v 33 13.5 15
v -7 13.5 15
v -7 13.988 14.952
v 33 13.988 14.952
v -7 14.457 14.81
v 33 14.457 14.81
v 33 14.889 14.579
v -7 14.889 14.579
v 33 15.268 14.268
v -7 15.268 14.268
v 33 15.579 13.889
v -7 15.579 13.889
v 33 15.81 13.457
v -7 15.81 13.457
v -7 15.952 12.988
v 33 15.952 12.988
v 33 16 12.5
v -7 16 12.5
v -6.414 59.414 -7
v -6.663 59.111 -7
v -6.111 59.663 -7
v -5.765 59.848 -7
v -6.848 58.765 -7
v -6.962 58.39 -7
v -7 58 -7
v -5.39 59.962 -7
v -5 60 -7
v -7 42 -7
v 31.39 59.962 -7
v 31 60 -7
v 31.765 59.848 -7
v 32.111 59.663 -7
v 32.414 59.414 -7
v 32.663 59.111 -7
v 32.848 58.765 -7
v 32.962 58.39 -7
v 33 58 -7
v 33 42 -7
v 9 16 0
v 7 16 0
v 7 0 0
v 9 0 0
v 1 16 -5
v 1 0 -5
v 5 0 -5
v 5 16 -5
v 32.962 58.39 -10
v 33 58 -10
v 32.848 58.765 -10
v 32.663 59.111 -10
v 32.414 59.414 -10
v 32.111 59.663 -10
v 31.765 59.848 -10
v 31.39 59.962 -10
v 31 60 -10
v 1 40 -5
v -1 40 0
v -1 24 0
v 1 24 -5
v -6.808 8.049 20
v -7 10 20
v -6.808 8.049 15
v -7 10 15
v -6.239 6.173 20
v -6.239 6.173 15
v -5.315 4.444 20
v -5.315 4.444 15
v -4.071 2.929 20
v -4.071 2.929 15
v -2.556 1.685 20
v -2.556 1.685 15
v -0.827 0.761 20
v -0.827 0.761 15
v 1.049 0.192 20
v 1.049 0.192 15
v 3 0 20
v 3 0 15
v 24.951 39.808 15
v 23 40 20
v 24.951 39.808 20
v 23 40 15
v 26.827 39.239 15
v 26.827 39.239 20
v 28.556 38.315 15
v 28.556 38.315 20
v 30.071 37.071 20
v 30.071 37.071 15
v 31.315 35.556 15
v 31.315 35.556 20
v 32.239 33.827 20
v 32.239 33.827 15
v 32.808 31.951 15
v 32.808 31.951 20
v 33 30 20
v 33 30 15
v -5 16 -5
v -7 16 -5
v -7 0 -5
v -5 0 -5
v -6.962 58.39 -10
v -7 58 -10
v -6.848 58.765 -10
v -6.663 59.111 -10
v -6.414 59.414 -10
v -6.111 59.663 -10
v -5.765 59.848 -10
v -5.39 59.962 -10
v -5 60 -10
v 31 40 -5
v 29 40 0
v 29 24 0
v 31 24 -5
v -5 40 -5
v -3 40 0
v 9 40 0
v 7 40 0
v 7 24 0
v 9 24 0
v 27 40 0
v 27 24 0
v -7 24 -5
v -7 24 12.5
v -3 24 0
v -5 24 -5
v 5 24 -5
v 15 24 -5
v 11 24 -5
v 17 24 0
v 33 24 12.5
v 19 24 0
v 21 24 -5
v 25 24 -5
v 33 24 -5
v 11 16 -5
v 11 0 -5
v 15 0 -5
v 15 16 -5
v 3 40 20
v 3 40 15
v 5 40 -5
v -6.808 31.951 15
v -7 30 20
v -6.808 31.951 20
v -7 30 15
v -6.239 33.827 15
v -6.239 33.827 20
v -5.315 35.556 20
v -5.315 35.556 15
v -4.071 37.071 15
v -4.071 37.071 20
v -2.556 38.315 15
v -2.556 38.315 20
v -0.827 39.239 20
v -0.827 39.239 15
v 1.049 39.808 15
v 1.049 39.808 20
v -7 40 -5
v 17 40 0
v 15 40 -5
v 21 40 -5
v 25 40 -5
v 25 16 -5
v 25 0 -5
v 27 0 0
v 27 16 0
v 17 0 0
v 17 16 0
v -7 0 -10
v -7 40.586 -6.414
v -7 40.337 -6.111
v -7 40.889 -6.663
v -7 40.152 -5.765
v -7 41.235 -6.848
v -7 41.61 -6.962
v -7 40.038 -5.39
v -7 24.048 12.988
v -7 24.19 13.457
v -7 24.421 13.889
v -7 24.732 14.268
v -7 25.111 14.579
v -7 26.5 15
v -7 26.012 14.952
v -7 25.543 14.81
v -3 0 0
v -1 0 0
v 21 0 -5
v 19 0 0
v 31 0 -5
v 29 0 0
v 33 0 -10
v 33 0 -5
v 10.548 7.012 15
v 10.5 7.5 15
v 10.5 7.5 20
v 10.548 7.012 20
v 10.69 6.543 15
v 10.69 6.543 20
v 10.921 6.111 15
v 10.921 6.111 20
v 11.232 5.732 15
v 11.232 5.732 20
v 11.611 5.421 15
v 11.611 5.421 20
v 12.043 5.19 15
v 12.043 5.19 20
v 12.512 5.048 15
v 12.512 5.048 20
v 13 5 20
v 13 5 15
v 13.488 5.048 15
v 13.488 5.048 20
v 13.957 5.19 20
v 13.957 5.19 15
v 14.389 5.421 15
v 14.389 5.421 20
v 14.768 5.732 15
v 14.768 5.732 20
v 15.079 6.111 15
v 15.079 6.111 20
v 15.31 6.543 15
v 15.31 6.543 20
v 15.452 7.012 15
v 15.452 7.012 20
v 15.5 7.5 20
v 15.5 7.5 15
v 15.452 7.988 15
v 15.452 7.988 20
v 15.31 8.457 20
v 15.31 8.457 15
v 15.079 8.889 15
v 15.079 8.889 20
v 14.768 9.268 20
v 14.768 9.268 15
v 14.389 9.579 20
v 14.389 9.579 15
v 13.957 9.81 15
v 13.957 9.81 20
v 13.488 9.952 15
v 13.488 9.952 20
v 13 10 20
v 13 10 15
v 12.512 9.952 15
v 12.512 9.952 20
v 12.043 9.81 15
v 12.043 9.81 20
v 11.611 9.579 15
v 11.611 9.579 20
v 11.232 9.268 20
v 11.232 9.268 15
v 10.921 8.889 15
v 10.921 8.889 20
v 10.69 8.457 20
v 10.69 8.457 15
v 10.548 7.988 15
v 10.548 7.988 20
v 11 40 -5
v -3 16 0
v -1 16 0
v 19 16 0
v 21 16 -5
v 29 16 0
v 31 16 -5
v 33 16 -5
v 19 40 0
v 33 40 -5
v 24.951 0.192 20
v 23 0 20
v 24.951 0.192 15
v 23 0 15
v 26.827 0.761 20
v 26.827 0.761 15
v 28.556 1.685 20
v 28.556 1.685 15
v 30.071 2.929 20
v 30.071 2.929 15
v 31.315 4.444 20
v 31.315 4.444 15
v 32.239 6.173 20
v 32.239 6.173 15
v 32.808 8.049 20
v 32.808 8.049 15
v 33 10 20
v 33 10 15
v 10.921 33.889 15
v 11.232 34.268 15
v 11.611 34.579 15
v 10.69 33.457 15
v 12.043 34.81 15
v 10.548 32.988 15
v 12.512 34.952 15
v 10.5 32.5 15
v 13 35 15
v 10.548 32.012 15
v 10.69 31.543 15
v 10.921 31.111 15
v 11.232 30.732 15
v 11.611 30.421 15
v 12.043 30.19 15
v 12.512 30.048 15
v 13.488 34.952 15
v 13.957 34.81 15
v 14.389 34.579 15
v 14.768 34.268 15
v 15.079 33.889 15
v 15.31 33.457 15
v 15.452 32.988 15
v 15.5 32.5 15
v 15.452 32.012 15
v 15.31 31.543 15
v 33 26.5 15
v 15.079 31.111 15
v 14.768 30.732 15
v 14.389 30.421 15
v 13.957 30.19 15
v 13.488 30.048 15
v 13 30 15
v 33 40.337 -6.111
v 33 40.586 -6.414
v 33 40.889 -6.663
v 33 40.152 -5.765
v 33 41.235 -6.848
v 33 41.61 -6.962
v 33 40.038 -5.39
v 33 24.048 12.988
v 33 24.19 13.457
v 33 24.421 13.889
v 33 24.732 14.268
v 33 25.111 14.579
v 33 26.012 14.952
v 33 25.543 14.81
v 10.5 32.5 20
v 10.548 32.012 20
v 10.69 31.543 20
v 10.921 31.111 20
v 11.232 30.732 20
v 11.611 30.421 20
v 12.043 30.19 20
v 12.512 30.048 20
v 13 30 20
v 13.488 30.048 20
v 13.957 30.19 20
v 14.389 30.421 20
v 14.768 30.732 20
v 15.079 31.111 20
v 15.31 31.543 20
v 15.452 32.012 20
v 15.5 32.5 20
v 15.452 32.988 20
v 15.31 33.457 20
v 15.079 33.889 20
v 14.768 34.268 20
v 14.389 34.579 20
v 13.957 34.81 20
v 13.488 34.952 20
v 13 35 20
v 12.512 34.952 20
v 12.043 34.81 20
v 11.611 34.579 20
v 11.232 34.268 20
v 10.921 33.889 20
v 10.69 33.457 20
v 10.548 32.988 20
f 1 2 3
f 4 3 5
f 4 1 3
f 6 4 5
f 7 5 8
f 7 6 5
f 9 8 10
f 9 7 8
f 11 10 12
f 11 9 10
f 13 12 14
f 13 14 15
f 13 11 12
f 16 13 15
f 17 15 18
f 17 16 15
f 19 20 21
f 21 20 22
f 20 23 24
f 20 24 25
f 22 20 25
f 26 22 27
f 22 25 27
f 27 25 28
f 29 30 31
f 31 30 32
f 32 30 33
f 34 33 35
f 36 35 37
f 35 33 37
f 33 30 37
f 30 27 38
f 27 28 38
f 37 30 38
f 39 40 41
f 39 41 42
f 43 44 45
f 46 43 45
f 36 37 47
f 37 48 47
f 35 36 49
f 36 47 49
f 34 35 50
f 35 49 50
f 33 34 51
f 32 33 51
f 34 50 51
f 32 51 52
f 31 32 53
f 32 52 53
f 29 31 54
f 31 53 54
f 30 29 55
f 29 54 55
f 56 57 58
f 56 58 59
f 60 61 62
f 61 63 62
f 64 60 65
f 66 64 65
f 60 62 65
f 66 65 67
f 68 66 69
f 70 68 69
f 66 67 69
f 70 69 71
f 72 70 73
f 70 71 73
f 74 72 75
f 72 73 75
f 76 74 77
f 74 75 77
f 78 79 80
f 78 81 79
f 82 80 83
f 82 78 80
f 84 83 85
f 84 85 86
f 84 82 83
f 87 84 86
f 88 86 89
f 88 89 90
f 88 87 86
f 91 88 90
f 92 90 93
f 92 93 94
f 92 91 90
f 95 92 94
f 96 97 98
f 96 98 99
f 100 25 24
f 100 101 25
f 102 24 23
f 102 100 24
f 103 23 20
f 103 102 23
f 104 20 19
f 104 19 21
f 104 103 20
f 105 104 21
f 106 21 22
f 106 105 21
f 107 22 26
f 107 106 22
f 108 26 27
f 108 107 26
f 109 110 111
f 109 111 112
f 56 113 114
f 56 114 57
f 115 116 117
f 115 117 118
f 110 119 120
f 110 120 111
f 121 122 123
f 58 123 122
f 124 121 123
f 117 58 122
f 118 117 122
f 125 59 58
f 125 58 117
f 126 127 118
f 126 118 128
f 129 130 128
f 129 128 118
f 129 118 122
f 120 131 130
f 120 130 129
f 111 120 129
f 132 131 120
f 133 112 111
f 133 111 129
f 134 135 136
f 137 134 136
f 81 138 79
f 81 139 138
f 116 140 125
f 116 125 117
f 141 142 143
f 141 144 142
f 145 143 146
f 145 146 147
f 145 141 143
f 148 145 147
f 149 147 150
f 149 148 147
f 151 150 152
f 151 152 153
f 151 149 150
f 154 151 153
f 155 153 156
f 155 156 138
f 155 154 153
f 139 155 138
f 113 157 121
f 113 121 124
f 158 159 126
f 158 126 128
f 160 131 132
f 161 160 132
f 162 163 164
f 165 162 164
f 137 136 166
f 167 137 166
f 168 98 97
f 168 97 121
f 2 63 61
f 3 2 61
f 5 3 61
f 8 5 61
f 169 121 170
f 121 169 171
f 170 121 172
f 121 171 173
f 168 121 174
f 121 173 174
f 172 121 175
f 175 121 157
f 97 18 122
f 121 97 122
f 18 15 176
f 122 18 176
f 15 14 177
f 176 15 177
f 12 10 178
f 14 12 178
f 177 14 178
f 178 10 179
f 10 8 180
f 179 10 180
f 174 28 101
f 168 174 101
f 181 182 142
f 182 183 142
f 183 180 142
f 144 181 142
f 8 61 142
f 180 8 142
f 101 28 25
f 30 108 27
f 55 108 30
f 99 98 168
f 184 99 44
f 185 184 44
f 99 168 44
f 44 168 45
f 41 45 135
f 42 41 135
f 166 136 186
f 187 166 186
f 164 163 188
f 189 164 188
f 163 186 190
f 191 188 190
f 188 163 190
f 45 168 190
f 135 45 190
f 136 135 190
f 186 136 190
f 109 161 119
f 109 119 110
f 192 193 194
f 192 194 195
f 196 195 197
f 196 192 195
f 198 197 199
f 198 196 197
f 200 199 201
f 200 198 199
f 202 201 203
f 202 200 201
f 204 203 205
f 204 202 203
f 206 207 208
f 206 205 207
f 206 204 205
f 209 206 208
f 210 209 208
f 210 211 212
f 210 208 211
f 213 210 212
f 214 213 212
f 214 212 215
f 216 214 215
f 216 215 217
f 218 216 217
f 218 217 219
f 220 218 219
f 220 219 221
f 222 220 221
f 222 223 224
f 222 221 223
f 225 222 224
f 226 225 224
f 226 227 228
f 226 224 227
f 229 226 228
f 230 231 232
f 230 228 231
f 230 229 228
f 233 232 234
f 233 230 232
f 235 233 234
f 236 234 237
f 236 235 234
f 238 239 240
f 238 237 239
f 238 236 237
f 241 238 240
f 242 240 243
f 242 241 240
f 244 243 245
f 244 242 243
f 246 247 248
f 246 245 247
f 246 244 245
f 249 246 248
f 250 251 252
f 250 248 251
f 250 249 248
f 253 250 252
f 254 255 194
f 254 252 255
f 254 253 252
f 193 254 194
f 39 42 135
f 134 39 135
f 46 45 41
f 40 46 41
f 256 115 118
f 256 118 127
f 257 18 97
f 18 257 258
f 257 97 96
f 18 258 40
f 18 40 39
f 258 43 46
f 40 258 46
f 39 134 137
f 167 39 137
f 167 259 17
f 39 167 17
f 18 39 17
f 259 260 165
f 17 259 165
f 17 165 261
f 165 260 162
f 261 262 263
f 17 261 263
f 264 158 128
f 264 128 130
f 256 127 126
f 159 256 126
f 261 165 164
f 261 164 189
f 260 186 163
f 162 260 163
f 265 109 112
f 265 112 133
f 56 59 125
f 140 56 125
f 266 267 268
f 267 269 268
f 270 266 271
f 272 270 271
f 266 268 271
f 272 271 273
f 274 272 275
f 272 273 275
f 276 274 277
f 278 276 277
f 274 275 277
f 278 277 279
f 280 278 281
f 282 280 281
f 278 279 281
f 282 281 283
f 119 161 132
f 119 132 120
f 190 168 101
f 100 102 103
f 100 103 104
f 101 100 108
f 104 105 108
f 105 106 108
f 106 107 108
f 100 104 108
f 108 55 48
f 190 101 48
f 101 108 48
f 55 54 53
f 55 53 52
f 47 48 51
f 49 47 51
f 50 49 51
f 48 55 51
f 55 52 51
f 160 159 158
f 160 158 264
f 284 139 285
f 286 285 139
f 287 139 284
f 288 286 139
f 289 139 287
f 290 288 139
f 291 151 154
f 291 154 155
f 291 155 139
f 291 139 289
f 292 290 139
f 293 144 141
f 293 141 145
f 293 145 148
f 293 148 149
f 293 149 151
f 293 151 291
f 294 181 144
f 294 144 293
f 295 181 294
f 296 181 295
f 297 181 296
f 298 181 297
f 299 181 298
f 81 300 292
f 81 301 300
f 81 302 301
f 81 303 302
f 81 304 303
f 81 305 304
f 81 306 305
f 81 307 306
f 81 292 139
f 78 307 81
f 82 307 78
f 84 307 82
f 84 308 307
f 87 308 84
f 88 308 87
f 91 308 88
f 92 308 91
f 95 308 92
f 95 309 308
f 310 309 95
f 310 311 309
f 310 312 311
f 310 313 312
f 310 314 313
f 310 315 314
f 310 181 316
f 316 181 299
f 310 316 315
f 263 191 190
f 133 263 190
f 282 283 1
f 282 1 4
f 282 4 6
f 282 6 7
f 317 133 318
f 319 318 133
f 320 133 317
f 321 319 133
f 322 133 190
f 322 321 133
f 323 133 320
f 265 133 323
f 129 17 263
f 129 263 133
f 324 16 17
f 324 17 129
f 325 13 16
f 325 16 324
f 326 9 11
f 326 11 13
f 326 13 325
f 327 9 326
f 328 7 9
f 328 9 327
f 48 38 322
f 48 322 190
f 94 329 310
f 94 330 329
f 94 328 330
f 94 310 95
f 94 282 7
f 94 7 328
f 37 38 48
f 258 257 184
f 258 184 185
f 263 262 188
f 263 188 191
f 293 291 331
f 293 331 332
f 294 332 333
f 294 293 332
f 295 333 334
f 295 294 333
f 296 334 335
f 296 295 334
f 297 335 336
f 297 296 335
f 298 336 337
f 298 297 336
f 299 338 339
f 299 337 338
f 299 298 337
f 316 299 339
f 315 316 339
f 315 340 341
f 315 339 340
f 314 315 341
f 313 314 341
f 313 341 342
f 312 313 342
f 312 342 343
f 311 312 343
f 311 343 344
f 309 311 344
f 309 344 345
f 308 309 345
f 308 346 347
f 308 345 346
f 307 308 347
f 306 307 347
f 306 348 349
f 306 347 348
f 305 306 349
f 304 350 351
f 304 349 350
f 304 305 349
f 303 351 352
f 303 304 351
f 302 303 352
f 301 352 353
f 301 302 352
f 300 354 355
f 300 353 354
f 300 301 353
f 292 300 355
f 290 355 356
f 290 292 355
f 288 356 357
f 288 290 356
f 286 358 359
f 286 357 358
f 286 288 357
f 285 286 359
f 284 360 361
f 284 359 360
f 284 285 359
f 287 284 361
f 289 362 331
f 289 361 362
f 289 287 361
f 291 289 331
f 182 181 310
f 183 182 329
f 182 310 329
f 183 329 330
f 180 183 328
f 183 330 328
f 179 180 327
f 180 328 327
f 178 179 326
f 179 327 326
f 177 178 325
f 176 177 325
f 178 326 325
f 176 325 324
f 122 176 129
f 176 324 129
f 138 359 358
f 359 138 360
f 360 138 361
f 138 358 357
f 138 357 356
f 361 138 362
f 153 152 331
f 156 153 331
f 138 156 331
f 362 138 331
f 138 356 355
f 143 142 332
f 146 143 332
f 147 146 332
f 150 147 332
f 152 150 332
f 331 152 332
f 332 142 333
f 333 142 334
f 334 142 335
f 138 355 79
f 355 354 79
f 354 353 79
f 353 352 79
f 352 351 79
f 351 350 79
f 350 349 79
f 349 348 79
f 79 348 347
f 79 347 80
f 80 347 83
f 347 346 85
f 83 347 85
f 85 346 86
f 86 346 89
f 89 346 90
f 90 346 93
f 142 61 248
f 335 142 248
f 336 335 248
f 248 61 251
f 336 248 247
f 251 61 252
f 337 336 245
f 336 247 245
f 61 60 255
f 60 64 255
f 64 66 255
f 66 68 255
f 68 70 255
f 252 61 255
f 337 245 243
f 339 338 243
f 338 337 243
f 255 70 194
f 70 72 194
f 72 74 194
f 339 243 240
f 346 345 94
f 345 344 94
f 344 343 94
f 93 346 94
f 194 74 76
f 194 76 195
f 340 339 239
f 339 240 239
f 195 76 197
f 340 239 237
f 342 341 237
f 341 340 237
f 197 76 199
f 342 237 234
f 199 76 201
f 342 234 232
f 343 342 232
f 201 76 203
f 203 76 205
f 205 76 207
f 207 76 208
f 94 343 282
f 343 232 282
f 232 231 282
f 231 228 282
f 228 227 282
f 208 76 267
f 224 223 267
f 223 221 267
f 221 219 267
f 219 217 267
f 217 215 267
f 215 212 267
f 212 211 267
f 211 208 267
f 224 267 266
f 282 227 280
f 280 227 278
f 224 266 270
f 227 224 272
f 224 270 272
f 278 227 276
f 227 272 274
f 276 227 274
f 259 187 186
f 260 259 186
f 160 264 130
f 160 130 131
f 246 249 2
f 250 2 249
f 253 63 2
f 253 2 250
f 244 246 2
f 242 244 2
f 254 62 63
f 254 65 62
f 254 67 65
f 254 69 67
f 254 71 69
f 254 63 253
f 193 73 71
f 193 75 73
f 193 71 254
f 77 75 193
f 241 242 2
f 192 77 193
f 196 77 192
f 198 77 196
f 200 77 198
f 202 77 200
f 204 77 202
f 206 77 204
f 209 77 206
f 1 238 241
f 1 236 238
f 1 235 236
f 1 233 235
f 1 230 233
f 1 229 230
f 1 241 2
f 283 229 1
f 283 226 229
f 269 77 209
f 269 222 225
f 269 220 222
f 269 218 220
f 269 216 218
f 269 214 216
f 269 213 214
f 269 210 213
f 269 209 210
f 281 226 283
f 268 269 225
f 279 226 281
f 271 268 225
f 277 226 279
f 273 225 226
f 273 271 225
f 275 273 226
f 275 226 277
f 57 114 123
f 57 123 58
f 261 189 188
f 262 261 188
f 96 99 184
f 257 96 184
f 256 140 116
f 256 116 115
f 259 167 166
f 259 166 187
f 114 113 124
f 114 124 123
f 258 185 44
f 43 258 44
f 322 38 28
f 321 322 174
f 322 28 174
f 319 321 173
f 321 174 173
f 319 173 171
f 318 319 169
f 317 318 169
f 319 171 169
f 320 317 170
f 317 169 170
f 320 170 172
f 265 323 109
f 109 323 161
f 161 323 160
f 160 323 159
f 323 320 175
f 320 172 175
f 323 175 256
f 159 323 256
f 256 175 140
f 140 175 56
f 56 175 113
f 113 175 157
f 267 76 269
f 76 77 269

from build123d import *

# Parameters (mm, degrees)
BOSS_EXTRUDE1_DEPTH      = 40
SKETCH2_W                = 40
SKETCH2_H                = 3
BOSS_EXTRUDE2_DEPTH      = 60
BOSS_EXTRUDE3_DEPTH      = 15
BOSS_EXTRUDE3_DEPTH_BACK = 10
SKETCH3_W                = 40
SKETCH3_H                = 8
SKETCH4_W                = 40
SKETCH4_H                = 5
BOSS_EXTRUDE4_DEPTH      = 40
SKETCH5_R                = 2.5
CUT_EXTRUDE1_DEPTH       = 40
FILLET1_R                = 10
FILLET2_R                = 2.5
FILLET3_START            = -7
FILLET3_DEPTH            = 40
FILLET4_R                = 2


with BuildPart() as part:
    # Sketch1 → Boss-Extrude1 (new body)
    with BuildSketch(Plane(origin=(0, 0, 0), x_dir=(1, 0, 0), z_dir=(0, 1, 0))):
        Polygon((-7, 10), (-7, 5), (-5, 5), (-3, 0), (-1, 0), (1, 5), (5, 5), (7, 0), (9, 0), (11, 5), (15, 5), (17, 0), (19, 0), (21, 5), (25, 5), (27, 0), (29, 0), (31, 5), (33, 5), (33, 10), (31.5, 10), align=None)
    extrude(amount=BOSS_EXTRUDE1_DEPTH)

    # Sketch2 → Boss-Extrude2 (add)
    with BuildSketch(Plane(origin=(0, 0, 0), x_dir=(1, 0, 0), z_dir=(0, 1, 0))):
        with Locations((13, 8.5)):
            Rectangle(SKETCH2_W, SKETCH2_H)
    extrude(amount=BOSS_EXTRUDE2_DEPTH)

    # Sketch3 → Boss-Extrude3 (add, two sides: drawn at the far end of the back side and taken through both)
    with BuildSketch(Plane.XY.offset(-BOSS_EXTRUDE3_DEPTH_BACK)):
        with Locations((13, 20)):
            Rectangle(SKETCH3_W, SKETCH3_H)
    extrude(amount=BOSS_EXTRUDE3_DEPTH + BOSS_EXTRUDE3_DEPTH_BACK)

    # Sketch4 → Boss-Extrude4 (add)
    with BuildSketch(Plane(origin=(0, 0, 0), x_dir=(1, 0, 0), z_dir=(0, 1, 0))):
        with Locations((13, -17.5)):
            Rectangle(SKETCH4_W, SKETCH4_H)
    extrude(amount=BOSS_EXTRUDE4_DEPTH)

    # Sketch5 → Cut-Extrude1 (cut)
    with BuildSketch(Plane.XY.offset(10)):
        with Locations(Location((13, 32.5, 0), (0, 0, 180))):
            Circle(SKETCH5_R)
        with Locations(Location((13, 7.5, 0), (0, 0, 180))):
            Circle(SKETCH5_R)
    extrude(amount=CUT_EXTRUDE1_DEPTH, mode=Mode.SUBTRACT)

    # Fillet1
    fillet1_edges = [part.edges().sort_by_distance(p)[0] for p in [
        (-7, 0, 17.5),
        (33, 0, 17.5),
        (33, 40, 17.5),
        (-7, 40, 17.5),
    ]]
    fillet(fillet1_edges, radius=FILLET1_R)

    # Fillet2
    fillet2_edges = [part.edges().sort_by_distance(p)[0] for p in [
        (13, 16, 15),
        (13, 24, 15),
    ]]
    fillet(fillet2_edges, radius=FILLET2_R)

    # Fillet3: read off the stored shape, not the designer's step
    # Fillet3 outline → Fillet3 (add)
    with BuildSketch(Plane.YZ.offset(FILLET3_START)):
        with BuildLine():
            Line((40, -7), (42, -7))
            ThreePointArc((42, -7), (40.585786438, -6.414213562), (40, -5))
            Line((40, -5), (40, -7))
        make_face()
    extrude(amount=FILLET3_DEPTH)

    # Fillet4
    fillet4_edges = [part.edges().sort_by_distance(p)[0] for p in [
        (-7, 60, -8.5),
        (33, 60, -8.5),
    ]]
    fillet(fillet4_edges, radius=FILLET4_R)


solid = part.part
